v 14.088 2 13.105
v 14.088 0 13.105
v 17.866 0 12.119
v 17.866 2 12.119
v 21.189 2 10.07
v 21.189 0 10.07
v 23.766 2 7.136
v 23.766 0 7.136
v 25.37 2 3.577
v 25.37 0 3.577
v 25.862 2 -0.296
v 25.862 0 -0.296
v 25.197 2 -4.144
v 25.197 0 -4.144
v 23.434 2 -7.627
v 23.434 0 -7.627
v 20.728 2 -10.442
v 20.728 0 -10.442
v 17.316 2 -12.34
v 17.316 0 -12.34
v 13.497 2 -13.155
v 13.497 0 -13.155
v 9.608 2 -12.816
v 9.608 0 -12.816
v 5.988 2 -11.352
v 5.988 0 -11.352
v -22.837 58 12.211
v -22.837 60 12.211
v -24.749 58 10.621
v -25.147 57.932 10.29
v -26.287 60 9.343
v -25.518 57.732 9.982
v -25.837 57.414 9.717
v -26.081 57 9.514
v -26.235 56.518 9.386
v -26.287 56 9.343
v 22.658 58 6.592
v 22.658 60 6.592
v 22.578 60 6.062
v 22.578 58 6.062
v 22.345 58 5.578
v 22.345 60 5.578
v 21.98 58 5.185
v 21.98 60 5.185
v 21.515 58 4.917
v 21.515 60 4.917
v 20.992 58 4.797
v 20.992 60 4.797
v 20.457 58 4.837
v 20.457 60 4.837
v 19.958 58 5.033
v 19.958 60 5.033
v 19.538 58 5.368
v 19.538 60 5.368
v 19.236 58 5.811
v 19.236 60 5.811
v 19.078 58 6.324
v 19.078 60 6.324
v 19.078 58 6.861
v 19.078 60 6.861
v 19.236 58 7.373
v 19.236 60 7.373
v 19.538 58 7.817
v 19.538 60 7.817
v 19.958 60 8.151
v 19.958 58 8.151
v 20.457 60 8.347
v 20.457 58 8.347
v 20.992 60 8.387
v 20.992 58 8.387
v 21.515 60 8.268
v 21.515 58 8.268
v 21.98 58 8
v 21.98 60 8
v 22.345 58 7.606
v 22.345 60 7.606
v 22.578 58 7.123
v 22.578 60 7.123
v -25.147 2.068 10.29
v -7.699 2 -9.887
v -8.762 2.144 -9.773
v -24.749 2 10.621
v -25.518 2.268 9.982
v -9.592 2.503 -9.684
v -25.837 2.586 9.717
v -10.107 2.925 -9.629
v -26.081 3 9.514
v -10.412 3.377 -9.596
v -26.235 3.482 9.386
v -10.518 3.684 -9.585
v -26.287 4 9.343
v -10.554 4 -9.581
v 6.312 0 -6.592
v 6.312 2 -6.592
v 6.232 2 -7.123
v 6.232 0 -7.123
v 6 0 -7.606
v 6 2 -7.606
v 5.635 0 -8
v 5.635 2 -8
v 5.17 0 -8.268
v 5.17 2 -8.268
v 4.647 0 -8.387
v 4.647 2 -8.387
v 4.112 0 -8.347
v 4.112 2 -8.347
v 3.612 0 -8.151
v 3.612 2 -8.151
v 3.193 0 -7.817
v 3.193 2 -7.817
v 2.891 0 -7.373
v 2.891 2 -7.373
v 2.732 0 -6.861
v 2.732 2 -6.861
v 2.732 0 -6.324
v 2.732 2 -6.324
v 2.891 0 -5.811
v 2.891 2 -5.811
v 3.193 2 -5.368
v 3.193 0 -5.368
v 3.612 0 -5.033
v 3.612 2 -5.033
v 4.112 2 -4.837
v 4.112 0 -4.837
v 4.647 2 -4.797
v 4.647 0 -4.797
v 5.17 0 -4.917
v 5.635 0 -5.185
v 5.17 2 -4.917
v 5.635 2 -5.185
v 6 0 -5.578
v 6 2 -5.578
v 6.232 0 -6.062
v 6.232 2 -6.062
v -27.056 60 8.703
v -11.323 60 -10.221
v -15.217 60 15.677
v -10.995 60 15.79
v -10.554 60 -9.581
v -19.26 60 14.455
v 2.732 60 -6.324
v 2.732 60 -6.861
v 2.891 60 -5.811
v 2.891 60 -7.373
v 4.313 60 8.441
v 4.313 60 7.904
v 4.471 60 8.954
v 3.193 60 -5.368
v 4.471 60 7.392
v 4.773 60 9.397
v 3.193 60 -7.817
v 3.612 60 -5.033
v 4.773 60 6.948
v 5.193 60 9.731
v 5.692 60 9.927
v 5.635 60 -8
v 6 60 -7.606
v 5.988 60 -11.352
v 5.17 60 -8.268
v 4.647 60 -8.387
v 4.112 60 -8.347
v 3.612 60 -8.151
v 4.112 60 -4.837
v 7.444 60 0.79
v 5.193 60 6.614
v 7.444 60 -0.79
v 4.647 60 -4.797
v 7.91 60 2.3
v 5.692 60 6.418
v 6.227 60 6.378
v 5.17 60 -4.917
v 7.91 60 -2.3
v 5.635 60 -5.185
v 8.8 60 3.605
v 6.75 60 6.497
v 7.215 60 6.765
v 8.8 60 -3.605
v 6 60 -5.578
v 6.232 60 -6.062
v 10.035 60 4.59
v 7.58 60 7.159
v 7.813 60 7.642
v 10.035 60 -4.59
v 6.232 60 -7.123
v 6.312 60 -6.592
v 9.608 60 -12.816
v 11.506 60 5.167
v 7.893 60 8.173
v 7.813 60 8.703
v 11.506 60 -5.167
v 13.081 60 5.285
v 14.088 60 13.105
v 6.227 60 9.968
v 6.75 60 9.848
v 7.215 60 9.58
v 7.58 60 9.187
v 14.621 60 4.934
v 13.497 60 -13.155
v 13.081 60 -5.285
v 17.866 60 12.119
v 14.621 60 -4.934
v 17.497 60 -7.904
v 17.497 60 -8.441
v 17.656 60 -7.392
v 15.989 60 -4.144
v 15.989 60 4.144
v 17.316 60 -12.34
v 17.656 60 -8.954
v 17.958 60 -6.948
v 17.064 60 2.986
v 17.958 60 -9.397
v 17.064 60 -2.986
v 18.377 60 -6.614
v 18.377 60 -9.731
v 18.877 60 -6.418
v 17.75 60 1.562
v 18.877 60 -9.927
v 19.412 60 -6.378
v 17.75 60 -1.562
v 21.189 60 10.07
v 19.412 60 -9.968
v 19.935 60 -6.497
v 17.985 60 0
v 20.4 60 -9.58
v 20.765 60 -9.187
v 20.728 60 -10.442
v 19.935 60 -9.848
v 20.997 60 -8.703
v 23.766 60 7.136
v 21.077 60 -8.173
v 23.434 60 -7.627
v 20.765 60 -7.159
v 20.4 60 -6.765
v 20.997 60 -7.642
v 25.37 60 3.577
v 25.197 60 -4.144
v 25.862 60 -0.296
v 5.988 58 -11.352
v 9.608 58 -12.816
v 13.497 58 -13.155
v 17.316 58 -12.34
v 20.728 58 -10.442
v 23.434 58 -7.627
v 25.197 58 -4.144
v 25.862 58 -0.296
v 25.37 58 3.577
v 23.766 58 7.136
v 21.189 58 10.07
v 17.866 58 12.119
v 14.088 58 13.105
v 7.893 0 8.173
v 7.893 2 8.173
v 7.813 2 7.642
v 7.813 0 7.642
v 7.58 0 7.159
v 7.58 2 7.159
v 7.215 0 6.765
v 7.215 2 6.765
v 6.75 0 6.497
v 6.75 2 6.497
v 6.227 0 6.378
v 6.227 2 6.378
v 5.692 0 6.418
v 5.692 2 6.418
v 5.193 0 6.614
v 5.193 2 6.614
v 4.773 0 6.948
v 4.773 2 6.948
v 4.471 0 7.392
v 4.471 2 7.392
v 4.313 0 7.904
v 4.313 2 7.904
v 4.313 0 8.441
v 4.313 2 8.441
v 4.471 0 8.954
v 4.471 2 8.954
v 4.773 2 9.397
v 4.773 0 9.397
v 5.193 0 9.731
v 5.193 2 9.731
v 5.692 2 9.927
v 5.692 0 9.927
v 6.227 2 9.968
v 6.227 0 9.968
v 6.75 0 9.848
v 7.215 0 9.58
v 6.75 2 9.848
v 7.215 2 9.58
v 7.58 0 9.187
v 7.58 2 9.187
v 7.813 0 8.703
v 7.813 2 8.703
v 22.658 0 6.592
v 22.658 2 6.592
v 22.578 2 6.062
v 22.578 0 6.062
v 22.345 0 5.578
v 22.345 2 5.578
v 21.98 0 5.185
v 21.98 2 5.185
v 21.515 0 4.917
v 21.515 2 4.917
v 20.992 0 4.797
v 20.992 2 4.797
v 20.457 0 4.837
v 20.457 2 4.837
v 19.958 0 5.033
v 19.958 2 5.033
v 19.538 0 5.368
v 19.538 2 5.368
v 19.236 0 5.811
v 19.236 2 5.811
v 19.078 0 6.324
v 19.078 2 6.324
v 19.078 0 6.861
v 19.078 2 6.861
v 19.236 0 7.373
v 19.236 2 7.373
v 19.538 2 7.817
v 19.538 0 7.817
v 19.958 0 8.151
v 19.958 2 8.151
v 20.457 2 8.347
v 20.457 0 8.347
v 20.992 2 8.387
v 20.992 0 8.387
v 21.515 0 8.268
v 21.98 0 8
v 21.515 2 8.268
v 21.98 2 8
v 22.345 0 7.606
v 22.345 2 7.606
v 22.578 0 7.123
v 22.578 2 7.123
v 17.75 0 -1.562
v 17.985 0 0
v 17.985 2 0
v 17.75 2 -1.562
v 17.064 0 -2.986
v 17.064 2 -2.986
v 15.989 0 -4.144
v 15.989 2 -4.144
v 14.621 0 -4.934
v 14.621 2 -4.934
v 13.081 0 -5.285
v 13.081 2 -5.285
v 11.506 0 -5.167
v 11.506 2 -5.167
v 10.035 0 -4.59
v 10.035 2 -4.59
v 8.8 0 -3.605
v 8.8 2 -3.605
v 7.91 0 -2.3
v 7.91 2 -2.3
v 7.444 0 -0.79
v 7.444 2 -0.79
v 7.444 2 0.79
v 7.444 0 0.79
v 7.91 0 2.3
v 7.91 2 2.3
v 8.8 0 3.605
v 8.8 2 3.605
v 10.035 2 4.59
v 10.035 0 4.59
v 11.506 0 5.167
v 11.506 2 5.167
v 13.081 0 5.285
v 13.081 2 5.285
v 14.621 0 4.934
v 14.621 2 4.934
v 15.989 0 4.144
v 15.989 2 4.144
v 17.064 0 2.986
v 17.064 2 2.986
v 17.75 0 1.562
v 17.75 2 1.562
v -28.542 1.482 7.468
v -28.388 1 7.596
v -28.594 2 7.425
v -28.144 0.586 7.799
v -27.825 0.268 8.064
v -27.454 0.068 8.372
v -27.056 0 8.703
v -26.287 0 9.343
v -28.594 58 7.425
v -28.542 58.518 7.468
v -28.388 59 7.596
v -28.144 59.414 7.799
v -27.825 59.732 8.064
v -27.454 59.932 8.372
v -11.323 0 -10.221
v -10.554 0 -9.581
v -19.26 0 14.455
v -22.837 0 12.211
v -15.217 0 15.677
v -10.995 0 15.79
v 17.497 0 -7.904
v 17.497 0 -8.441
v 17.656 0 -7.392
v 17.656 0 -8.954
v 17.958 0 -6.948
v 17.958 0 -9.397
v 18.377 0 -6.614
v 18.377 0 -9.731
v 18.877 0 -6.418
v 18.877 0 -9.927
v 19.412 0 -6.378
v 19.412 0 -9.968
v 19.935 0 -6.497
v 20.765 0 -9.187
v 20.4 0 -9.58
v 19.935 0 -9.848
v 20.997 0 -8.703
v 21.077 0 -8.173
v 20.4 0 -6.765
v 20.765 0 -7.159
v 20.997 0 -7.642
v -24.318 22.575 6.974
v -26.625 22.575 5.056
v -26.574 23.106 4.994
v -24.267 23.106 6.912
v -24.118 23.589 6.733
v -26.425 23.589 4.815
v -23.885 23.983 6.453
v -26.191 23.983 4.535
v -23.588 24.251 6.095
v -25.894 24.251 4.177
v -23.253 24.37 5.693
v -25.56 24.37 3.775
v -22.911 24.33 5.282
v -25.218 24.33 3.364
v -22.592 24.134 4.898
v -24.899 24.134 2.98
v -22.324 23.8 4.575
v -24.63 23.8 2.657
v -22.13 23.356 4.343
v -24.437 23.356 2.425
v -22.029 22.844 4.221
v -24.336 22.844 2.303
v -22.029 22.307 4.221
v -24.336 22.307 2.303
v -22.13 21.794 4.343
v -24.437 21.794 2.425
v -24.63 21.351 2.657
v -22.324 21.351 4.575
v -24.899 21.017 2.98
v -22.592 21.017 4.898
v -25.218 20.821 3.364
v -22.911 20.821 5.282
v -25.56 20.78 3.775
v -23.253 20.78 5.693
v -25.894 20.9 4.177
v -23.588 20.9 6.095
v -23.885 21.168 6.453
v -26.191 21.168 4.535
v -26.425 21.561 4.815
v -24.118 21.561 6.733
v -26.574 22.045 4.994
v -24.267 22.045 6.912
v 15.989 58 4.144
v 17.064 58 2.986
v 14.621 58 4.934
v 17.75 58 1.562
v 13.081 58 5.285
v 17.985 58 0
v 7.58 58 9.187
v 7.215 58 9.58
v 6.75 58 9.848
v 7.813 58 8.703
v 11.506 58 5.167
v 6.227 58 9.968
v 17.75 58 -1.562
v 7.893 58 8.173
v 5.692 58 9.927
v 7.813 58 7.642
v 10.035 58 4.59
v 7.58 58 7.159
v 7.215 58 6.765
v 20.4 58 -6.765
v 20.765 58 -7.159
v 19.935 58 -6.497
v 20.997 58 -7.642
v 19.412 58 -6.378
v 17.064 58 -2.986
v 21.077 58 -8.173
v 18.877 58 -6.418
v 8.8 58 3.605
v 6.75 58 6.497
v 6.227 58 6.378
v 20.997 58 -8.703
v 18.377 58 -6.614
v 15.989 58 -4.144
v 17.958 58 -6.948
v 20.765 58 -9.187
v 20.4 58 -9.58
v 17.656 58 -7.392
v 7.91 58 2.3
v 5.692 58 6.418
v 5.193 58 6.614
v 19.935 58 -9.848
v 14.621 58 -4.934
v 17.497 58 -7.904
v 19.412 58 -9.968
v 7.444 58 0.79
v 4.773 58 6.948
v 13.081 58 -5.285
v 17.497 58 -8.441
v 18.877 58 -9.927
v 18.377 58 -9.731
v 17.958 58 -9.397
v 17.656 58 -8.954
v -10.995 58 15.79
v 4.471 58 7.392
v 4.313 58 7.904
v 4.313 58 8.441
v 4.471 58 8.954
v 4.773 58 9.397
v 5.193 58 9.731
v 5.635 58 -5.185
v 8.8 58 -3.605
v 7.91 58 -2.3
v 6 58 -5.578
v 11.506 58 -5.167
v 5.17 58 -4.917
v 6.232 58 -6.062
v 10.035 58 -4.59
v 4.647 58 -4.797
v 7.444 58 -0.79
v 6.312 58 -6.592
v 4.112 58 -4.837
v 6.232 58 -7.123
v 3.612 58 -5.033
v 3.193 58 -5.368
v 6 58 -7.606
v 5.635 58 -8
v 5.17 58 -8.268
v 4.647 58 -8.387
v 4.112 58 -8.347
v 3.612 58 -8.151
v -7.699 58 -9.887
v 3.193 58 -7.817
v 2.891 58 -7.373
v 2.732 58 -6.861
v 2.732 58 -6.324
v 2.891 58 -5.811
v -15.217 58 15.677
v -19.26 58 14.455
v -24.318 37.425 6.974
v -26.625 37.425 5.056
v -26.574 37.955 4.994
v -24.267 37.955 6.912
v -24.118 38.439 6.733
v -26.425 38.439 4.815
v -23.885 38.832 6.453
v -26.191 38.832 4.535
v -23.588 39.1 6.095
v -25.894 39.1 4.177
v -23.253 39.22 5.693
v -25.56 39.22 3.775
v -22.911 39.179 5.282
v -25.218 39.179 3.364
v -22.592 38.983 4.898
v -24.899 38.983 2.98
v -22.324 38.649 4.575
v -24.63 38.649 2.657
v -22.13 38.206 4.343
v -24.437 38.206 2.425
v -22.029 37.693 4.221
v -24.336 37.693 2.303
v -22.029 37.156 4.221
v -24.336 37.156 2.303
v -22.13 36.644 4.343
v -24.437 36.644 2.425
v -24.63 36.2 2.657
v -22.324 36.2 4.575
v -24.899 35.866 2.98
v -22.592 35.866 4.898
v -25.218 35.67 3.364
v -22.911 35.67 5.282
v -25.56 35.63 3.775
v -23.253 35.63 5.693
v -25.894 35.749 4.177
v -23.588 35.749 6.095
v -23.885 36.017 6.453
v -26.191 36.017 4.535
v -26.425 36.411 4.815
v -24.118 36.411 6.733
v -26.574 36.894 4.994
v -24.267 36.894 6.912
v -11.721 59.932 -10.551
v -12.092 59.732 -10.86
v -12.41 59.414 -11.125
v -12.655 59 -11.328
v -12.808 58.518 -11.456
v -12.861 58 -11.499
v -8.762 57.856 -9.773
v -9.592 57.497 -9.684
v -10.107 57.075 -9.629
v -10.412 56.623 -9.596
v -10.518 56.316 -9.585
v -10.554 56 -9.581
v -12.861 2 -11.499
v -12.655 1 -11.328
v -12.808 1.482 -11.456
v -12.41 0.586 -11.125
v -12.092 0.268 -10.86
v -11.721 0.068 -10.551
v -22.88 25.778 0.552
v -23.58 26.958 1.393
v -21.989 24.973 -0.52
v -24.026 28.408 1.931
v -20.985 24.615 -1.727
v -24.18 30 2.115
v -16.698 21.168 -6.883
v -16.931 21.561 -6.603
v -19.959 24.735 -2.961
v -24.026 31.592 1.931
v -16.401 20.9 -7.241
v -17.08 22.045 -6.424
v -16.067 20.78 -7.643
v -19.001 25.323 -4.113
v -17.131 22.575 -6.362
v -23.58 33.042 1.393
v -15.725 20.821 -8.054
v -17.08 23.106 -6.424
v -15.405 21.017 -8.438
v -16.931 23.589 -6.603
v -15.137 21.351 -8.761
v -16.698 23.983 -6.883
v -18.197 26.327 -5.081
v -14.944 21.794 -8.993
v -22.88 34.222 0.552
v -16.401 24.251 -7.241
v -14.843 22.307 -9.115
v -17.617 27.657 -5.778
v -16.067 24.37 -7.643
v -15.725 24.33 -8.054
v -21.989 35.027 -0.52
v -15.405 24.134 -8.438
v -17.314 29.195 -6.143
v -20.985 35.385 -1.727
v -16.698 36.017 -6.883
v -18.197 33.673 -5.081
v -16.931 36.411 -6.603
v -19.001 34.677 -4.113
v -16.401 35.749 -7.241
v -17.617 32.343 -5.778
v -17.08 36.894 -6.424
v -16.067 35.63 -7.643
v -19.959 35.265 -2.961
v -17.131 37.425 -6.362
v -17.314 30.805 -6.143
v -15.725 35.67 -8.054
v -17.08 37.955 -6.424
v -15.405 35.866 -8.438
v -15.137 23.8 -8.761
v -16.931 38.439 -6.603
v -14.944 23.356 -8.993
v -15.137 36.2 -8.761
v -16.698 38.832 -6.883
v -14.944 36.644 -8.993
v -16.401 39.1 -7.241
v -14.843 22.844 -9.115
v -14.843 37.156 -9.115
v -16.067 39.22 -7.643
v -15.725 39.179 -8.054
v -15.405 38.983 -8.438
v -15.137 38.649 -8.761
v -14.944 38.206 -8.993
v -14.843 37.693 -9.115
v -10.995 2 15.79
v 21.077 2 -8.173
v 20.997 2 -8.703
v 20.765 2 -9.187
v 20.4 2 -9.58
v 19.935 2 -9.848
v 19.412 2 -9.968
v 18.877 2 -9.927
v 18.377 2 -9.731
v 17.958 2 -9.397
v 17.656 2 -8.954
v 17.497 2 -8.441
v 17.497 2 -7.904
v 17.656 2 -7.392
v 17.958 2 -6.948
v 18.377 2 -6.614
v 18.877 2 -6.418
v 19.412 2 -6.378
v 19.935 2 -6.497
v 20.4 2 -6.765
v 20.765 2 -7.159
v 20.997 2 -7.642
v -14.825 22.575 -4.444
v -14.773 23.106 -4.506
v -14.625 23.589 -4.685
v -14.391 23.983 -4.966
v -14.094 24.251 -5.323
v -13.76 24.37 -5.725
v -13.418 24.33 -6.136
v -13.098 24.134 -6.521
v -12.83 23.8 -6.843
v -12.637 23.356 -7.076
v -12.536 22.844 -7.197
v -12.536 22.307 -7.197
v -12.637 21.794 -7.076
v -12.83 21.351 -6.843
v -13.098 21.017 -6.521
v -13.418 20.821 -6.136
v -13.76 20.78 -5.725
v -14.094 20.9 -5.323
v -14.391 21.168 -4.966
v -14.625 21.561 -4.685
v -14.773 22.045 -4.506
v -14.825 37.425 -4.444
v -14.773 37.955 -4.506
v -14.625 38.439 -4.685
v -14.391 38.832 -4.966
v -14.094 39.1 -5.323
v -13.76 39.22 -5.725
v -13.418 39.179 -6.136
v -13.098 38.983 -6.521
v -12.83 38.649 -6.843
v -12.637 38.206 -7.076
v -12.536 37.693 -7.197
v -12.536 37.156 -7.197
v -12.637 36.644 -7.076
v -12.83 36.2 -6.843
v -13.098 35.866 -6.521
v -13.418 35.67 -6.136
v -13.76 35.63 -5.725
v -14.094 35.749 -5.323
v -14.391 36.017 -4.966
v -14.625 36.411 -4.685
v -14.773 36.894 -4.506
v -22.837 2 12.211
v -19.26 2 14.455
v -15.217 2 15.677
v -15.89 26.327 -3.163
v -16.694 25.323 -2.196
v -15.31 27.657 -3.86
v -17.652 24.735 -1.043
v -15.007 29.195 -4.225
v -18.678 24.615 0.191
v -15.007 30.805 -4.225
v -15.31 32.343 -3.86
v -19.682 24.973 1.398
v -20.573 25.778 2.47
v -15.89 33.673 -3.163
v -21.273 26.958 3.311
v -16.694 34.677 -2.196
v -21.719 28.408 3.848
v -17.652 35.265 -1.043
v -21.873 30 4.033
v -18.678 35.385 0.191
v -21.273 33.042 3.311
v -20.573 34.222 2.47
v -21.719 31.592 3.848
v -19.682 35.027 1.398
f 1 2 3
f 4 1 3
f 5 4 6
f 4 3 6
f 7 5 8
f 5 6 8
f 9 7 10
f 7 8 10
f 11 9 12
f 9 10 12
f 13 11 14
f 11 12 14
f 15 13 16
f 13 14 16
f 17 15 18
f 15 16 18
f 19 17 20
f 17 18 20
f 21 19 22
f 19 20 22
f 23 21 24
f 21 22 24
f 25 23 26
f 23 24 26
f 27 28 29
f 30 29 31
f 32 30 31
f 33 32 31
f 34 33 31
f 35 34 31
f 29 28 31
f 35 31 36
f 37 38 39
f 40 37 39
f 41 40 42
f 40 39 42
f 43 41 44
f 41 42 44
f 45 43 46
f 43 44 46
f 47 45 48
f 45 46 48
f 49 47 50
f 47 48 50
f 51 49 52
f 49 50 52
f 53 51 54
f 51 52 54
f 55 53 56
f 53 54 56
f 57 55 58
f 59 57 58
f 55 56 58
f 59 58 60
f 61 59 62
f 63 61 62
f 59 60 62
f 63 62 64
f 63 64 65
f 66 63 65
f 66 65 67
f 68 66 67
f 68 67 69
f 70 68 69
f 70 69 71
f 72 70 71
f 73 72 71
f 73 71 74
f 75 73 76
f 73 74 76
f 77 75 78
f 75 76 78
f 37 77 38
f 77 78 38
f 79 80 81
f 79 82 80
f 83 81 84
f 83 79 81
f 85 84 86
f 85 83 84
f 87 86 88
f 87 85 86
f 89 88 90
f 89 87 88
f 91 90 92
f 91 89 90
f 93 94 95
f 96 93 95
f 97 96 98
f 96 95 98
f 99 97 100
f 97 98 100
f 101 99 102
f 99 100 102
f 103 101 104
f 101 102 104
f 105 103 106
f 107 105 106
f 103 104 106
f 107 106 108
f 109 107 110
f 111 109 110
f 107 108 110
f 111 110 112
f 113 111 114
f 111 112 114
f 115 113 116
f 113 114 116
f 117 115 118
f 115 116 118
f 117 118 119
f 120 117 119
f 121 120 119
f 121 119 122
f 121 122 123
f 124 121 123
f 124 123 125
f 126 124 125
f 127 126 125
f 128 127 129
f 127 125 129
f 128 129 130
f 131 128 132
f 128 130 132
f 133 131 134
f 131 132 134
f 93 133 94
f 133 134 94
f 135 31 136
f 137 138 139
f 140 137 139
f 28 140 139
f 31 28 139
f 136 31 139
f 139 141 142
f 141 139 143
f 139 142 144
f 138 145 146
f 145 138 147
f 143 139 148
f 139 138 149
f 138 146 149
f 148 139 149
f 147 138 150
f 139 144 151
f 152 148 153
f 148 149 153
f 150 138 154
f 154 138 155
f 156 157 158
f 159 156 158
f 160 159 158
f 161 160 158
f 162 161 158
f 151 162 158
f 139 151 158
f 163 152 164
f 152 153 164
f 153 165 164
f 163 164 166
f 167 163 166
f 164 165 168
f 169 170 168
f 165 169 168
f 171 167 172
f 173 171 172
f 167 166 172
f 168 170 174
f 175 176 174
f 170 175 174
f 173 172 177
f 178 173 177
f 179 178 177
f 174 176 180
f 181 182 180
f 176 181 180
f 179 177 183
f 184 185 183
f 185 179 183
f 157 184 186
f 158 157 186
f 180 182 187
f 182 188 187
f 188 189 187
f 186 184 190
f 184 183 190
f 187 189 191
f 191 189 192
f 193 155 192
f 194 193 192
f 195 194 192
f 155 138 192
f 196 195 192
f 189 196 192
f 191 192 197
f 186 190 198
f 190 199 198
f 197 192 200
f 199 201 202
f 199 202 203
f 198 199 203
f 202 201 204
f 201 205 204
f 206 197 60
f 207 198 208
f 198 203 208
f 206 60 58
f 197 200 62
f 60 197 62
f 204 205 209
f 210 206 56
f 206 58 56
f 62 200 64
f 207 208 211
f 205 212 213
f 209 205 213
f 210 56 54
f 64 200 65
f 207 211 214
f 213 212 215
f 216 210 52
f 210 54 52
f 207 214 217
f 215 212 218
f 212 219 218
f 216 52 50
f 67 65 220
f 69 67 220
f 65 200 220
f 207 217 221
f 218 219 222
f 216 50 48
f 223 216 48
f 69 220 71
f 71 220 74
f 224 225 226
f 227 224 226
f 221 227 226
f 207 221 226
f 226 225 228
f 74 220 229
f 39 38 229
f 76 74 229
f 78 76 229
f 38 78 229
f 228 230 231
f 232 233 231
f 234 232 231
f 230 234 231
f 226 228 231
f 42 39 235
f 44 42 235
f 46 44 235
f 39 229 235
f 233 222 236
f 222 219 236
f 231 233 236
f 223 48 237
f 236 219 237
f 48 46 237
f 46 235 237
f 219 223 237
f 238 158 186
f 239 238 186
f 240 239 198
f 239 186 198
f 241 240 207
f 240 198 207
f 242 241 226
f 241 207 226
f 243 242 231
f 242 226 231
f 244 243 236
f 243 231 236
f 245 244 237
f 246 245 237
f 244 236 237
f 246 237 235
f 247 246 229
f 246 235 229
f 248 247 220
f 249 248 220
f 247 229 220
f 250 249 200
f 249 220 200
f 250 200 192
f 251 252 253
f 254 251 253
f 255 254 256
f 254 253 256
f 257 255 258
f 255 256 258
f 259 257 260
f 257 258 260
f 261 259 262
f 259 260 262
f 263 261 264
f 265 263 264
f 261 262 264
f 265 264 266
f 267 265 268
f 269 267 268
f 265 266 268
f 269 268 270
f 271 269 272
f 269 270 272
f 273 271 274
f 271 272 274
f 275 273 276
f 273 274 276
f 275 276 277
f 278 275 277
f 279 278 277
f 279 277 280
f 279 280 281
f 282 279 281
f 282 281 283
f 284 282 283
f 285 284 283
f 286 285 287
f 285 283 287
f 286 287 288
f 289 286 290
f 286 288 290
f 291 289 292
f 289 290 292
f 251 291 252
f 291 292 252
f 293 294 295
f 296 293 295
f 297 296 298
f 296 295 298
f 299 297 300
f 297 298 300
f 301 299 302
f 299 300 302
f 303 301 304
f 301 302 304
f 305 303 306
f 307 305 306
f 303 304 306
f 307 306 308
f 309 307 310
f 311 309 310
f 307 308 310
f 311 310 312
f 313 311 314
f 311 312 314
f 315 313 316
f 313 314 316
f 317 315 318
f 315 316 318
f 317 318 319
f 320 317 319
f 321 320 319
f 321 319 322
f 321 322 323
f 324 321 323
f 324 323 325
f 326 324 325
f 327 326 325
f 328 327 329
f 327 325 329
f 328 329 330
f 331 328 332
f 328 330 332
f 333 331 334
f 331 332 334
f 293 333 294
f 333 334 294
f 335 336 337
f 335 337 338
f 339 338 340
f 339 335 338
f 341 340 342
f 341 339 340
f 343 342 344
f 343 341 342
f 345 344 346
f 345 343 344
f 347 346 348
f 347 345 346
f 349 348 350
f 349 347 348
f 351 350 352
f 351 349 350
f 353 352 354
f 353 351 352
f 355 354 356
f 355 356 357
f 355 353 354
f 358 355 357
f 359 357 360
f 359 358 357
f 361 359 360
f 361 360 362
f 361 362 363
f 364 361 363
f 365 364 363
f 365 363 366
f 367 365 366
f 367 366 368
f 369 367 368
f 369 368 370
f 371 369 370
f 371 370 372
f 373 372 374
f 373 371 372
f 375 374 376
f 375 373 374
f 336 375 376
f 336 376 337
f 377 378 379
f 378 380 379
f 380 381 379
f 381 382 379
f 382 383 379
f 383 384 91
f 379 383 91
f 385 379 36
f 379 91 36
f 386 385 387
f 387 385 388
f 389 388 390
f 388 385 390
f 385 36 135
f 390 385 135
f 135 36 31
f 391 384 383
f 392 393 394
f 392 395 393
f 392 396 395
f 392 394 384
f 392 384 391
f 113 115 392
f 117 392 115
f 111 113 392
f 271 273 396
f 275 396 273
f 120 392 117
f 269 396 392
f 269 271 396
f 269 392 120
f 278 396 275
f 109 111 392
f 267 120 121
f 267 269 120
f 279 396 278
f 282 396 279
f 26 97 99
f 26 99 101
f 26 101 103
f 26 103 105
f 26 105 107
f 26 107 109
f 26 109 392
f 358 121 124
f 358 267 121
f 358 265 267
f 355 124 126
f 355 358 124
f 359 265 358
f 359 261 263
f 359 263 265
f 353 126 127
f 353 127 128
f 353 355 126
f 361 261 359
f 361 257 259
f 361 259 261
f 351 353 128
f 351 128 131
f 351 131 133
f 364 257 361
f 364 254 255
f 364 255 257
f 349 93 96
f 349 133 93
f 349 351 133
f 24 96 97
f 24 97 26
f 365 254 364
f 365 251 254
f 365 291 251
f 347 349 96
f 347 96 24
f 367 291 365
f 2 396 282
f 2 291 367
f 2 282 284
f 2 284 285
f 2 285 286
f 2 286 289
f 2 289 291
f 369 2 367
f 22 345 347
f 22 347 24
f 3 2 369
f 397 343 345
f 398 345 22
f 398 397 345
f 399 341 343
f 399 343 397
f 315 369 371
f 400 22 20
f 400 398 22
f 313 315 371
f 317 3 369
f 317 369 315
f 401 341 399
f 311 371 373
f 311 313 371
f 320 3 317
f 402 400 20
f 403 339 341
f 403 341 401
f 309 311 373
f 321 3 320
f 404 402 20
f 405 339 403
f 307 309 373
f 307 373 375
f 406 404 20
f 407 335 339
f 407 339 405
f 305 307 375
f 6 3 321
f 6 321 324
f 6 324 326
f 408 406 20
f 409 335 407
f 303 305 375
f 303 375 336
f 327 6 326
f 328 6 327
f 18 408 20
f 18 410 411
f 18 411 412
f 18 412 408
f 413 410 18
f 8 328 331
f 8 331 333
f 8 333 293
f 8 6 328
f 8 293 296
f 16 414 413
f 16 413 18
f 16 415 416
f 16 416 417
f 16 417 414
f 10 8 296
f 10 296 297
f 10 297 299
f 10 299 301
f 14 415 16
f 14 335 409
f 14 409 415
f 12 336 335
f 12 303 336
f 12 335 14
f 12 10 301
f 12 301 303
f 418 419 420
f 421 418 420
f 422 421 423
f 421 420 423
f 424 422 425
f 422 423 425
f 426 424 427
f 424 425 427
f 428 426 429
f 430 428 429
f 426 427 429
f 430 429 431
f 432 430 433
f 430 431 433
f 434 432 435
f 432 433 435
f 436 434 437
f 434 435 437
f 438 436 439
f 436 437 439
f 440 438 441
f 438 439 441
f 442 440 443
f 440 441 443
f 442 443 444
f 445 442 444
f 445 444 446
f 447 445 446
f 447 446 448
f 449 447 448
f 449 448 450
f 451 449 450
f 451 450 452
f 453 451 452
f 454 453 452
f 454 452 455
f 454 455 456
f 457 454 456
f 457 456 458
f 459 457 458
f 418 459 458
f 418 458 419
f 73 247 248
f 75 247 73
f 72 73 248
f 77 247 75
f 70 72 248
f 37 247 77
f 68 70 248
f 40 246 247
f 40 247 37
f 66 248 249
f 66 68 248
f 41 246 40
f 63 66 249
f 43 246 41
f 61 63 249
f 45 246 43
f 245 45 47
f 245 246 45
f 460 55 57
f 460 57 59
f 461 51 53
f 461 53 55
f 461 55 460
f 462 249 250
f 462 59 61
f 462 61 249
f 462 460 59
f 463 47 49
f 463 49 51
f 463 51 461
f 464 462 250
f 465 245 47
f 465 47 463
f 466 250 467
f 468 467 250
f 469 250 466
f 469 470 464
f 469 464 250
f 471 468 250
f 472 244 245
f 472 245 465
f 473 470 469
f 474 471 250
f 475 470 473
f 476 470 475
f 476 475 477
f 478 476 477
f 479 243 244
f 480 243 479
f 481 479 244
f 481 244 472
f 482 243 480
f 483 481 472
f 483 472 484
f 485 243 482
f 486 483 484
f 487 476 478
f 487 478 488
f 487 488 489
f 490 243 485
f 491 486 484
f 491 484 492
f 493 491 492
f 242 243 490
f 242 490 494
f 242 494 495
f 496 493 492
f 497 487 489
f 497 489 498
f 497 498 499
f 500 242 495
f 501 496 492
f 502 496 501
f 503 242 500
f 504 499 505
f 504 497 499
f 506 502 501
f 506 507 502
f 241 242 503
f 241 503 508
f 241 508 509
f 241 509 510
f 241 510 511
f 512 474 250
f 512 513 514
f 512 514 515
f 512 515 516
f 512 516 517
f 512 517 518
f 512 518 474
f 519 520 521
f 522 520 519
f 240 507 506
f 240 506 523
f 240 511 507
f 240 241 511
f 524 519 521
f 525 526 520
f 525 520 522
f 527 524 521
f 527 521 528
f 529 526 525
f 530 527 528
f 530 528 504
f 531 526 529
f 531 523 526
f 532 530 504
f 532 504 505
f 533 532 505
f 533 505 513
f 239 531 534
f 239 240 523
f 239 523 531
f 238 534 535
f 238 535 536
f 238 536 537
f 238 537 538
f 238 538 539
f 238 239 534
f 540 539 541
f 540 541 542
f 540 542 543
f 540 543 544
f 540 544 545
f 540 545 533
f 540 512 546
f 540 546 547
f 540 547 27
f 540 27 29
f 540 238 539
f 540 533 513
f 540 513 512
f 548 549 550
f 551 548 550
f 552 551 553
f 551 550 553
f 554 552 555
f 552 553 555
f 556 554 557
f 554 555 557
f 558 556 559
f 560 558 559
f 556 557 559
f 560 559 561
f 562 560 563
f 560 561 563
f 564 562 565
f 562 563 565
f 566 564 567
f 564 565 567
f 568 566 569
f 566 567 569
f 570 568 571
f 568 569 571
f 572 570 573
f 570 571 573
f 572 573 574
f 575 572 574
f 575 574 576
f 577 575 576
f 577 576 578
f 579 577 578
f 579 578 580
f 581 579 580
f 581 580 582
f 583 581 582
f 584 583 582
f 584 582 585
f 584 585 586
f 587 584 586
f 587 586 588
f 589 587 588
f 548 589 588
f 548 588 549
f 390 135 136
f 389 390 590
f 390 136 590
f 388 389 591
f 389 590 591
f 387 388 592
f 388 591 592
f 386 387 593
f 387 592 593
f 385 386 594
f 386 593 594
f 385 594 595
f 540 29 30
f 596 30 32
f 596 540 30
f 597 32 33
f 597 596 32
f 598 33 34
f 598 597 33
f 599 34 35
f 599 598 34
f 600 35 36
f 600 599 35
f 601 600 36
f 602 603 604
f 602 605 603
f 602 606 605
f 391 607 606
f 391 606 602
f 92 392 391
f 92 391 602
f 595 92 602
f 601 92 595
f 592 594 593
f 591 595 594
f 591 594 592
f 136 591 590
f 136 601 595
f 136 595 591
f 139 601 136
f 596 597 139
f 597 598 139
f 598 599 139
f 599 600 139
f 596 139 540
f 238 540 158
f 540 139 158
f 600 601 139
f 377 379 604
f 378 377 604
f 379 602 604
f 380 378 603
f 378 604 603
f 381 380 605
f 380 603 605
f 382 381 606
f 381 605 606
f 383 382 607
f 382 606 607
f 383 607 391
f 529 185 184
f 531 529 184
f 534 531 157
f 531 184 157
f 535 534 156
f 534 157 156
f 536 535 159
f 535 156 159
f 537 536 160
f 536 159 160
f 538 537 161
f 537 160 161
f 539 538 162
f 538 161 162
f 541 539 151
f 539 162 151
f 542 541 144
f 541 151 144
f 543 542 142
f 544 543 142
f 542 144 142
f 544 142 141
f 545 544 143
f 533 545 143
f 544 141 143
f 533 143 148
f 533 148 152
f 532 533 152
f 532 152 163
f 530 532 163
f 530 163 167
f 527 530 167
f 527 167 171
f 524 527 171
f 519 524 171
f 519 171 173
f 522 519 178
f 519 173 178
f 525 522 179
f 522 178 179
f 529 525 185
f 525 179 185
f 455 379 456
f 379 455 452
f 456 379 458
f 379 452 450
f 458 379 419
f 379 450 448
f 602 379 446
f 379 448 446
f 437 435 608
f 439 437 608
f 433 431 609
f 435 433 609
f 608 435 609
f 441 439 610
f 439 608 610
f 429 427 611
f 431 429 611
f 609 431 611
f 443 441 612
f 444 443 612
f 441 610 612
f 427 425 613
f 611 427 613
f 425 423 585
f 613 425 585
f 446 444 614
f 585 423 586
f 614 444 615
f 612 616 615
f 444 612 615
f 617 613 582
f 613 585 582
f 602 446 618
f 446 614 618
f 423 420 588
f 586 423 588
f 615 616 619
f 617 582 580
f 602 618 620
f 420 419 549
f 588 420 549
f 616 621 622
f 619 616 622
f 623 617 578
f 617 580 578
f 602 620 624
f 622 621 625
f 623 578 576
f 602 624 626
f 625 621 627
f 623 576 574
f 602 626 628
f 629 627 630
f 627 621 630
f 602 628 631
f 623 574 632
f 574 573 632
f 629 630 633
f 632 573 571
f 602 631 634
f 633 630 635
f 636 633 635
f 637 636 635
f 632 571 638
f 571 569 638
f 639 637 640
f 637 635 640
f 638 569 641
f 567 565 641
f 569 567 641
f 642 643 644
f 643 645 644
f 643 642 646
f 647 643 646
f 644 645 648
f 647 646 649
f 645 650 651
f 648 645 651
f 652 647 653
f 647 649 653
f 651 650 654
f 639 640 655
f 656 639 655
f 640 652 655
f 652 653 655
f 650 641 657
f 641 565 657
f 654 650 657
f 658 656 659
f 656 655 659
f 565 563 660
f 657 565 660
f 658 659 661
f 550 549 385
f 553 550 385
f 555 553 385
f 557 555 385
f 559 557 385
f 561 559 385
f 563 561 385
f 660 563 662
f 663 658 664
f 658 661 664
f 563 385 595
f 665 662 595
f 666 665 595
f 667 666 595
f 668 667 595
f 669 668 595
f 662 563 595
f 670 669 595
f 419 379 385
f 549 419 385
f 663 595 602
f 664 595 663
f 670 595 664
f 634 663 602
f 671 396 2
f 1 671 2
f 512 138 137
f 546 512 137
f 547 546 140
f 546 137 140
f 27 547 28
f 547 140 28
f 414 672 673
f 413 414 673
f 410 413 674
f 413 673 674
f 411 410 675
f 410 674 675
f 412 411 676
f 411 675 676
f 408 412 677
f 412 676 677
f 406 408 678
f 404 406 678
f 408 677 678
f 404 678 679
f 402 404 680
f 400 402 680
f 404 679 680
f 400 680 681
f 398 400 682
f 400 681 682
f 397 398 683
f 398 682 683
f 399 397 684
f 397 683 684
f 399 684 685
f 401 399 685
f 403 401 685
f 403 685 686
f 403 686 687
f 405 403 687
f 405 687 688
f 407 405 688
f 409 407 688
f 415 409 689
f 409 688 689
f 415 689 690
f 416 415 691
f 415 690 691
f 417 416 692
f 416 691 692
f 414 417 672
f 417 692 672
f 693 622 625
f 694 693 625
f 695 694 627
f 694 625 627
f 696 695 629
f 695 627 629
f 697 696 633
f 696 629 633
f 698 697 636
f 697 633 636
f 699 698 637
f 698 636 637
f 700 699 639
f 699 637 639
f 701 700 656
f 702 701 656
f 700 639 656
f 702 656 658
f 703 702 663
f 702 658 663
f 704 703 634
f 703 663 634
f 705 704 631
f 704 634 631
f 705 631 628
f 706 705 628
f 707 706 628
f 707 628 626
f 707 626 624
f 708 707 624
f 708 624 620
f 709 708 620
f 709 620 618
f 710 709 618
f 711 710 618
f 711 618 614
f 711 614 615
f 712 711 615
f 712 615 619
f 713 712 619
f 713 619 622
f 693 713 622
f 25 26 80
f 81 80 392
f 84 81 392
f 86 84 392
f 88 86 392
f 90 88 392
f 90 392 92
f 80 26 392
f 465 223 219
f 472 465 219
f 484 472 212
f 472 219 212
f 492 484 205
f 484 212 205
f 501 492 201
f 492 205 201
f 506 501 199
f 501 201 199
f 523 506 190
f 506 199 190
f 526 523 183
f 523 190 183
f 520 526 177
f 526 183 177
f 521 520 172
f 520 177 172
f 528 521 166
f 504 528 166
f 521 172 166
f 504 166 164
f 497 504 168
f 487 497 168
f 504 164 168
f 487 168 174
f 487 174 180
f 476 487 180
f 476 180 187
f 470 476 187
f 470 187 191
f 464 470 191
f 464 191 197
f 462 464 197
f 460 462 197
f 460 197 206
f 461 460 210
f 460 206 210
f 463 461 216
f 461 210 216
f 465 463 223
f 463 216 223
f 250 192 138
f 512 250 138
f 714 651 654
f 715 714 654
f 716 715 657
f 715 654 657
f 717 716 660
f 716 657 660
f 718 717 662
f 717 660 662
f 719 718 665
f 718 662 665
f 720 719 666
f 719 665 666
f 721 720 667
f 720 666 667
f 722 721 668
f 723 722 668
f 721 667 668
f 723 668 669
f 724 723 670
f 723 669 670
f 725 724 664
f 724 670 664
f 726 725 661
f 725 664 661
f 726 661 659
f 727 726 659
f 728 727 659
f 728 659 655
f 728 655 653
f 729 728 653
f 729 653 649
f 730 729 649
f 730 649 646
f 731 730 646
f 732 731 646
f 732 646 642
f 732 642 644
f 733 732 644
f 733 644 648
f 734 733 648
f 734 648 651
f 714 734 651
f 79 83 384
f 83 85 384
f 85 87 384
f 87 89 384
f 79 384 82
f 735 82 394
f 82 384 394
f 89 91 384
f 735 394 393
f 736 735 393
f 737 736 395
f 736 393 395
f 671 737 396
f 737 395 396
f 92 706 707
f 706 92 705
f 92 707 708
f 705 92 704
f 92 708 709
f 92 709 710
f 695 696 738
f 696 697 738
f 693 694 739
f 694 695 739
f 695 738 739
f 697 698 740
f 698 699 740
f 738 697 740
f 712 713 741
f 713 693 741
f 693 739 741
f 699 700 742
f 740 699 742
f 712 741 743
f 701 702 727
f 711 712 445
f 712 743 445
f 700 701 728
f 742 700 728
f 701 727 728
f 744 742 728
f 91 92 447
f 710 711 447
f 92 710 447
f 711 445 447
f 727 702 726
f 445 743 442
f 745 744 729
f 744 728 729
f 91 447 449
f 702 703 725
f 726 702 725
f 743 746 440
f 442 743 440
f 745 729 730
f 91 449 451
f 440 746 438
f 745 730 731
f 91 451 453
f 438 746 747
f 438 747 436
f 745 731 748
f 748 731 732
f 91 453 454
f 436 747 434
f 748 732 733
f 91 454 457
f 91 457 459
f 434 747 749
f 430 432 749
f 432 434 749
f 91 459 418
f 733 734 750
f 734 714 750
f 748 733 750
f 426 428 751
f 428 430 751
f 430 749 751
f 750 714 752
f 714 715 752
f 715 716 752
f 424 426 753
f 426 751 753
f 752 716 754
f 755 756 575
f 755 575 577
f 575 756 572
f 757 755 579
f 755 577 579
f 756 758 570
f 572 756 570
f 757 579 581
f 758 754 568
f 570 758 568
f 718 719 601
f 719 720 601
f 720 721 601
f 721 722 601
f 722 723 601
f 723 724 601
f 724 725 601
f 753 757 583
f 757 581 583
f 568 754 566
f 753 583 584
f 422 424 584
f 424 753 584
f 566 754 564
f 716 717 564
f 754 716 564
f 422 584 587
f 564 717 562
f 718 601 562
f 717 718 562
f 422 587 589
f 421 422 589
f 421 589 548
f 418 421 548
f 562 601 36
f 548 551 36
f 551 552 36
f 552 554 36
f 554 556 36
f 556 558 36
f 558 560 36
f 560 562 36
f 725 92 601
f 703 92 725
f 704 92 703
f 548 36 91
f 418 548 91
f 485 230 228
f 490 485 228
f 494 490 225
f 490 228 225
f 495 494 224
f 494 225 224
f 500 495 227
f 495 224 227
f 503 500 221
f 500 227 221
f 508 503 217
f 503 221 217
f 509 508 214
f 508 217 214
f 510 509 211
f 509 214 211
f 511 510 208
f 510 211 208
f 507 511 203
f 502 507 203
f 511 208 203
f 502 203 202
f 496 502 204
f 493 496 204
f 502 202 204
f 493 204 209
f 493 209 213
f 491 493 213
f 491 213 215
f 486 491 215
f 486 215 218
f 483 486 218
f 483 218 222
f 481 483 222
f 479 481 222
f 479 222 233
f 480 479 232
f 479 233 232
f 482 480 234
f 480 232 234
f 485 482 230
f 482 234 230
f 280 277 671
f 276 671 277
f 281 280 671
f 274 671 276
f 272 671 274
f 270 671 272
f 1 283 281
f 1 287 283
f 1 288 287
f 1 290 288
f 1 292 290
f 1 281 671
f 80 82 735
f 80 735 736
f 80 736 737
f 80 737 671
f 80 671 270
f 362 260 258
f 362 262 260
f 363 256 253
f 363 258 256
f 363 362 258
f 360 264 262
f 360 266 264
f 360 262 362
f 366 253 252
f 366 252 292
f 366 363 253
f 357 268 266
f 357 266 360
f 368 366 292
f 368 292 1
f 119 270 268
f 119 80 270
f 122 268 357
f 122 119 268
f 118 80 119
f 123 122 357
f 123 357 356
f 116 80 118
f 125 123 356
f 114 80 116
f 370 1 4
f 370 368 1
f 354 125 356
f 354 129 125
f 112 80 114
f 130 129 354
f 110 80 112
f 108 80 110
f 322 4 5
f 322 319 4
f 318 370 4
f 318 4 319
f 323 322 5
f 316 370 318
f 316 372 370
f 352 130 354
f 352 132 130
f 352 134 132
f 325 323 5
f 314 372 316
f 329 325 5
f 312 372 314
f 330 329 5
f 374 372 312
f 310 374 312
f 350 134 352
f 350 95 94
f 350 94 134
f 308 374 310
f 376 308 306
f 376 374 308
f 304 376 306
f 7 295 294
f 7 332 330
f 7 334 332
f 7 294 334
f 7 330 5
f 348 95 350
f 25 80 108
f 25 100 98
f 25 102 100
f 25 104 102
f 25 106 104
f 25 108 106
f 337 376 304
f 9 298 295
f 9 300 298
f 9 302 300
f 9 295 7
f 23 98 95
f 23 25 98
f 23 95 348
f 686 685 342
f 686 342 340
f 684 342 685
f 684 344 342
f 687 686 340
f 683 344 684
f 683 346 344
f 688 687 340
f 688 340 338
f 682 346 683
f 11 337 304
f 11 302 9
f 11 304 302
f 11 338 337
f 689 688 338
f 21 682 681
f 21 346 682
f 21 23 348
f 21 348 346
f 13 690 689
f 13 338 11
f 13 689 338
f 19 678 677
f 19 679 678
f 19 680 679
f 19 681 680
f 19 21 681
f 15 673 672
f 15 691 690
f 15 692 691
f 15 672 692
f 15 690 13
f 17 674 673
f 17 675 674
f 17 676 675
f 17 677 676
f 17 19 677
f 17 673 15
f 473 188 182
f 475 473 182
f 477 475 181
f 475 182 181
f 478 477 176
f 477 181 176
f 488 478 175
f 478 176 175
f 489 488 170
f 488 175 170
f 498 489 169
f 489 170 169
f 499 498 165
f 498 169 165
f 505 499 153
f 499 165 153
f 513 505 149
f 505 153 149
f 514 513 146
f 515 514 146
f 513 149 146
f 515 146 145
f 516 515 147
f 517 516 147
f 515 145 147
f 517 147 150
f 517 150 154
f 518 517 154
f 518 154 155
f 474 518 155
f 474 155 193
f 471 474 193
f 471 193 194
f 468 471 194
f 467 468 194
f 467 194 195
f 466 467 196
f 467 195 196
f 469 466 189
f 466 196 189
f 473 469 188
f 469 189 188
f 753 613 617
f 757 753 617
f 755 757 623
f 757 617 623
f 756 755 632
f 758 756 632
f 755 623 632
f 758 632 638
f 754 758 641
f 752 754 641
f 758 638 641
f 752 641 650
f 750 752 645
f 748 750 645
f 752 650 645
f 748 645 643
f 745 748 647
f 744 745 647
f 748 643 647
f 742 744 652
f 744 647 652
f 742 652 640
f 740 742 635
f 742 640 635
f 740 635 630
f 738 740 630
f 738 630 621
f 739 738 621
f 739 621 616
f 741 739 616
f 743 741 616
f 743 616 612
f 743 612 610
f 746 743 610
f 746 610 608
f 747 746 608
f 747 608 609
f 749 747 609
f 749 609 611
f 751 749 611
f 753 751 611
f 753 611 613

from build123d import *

# Parameters (mm, degrees)
CROQUIS1_R              = 5.3
SALIENTE_EXTRUIR1_DEPTH = 2
CROQUIS2_R              = 1.8
CORTAR_EXTRUIR1_DEPTH   = 2
CROQUIS3_W              = 24.61
CROQUIS3_H              = 60
SALIENTE_EXTRUIR2_DEPTH = 2
CROQUIS4_R              = 5.3
CROQUIS4_R_2            = 1.8
SALIENTE_EXTRUIR3_DEPTH = 2
CORTAR_EXTRUIR2_REACH   = 48.282
CROQUIS5_R              = 5.4
CROQUIS5_R_2            = 1.8
CROQUIS6_W              = 24.61
CROQUIS6_H              = 60
SALIENTE_EXTRUIR4_DEPTH = 1
CORTAR_EXTRUIR3_REACH   = 49.282
CROQUIS7_R              = 5.4
CROQUIS7_R_2            = 1.8
REDONDEO1_R             = 2


with BuildPart() as part:
    # Croquis1 → Saliente-Extruir1 (new body)
    with BuildSketch(Plane(origin=(0, 0, 0), x_dir=(1, 0, 0), z_dir=(0, 1, 0))):
        with BuildLine():
            Line((-10.994972408, -15.789813385), (14.087680331, -13.105147381))
            ThreePointArc((14.087680331, -13.105147381), (25.196689721, 4.143672323), (5.987949996, 11.351736486))
            Line((5.987949996, 11.351736486), (-10.55372573, 9.581234979))
            Line((-10.55372573, 9.581234979), (-26.287258722, -9.342507769))
            Line((-26.287258722, -9.342507769), (-22.837316291, -12.210850664))
            ThreePointArc((-22.837316291, -12.210850664), (-17.278998917, -15.200972796), (-10.994972408, -15.789813385))
        make_face()
        with Locations((12.685, 0)):
            Circle(CROQUIS1_R, mode=Mode.SUBTRACT)
    extrude(amount=SALIENTE_EXTRUIR1_DEPTH)

    # Croquis2 → Cortar-Extruir1 (cut)
    with BuildSketch(Plane(origin=(0, 2, 0), x_dir=(1, 0, 0), z_dir=(0, 1, 0))):
        with Locations((6.092709789, -8.172619517)):
            Circle(CROQUIS2_R)
        with Locations((20.857619517, -6.592290211)):
            Circle(CROQUIS2_R)
        with Locations((19.277290211, 8.172619517)):
            Circle(CROQUIS2_R)
        with Locations((4.512380483, 6.592290211)):
            Circle(CROQUIS2_R)
    extrude(amount=-CORTAR_EXTRUIR1_DEPTH, mode=Mode.SUBTRACT)

    # Croquis3 → Saliente-Extruir2 (add)
    with BuildSketch(Plane(origin=(-10.950288723, 0, -9.104262893), x_dir=(-0.639314628, 0, 0.768945256), z_dir=(-0.768945256, 0, -0.639314628))):
        with Locations((11.684706055, 30)):
            Rectangle(CROQUIS3_W, CROQUIS3_H)
    extrude(amount=SALIENTE_EXTRUIR2_DEPTH)

    # Croquis4 → Saliente-Extruir3 (add)
    with BuildSketch(Plane(origin=(0, 60, 0), x_dir=(1, 0, 0), z_dir=(0, 1, 0))):
        with BuildLine():
            Line((14.087680331, -13.105147381), (-10.994972408, -15.789813385))
            ThreePointArc((-10.994972408, -15.789813385), (-17.278998917, -15.200972796), (-22.837316291, -12.210850664))
            Line((-22.837316291, -12.210850664), (-26.287258722, -9.342507769))
            Line((-26.287258722, -9.342507769), (-10.55372573, 9.581234979))
            Line((-10.55372573, 9.581234979), (5.987949996, 11.351736486))
            ThreePointArc((5.987949996, 11.351736486), (25.196689721, 4.143672323), (14.087680331, -13.105147381))
        make_face()
        with Locations((12.685, 0)):
            Circle(CROQUIS4_R, mode=Mode.SUBTRACT)
        with Locations((4.512380483, 6.592290211)):
            Circle(CROQUIS4_R_2, mode=Mode.SUBTRACT)
        with Locations((19.277290211, 8.172619517)):
            Circle(CROQUIS4_R_2, mode=Mode.SUBTRACT)
        with Locations((20.857619517, -6.592290211)):
            Circle(CROQUIS4_R_2, mode=Mode.SUBTRACT)
        with Locations((6.092709789, -8.172619517)):
            Circle(CROQUIS4_R_2, mode=Mode.SUBTRACT)
    extrude(amount=-SALIENTE_EXTRUIR3_DEPTH)

    # Croquis5 → Cortar-Extruir2 (cut, up to next)
    with BuildSketch(Plane(origin=(-12.488179234, 0, -10.382892148), x_dir=(-0.639314628, 0, 0.768945256), z_dir=(-0.768945256, 0, -0.639314628)), mode=Mode.PRIVATE) as cortar_extruir2_sk1:
        with Locations((11.684706055, 30)):
            Circle(CROQUIS5_R)
    cortar_extruir2_tool1 = extrude(cortar_extruir2_sk1.sketch, amount=-CORTAR_EXTRUIR2_REACH, mode=Mode.PRIVATE) & part.part
    add(cortar_extruir2_tool1.solids().sort_by_distance((-19.958383, 30, -1.397993))[0], mode=Mode.SUBTRACT)
    # Croquis5 → Cortar-Extruir2 (cut, up to next)
    with BuildSketch(Plane(origin=(-12.488179234, 0, -10.382892148), x_dir=(-0.639314628, 0, 0.768945256), z_dir=(-0.768945256, 0, -0.639314628)), mode=Mode.PRIVATE) as cortar_extruir2_sk2:
        with Locations((19.109327257, 37.424621202)):
            Circle(CROQUIS5_R_2)
    cortar_extruir2_tool2 = extrude(cortar_extruir2_sk2.sketch, amount=-CORTAR_EXTRUIR2_REACH, mode=Mode.PRIVATE) & part.part
    add(cortar_extruir2_tool2.solids().sort_by_distance((-24.705052, 37.424621, 4.311134))[0], mode=Mode.SUBTRACT)
    # Croquis5 → Cortar-Extruir2 (cut, up to next)
    with BuildSketch(Plane(origin=(-12.488179234, 0, -10.382892148), x_dir=(-0.639314628, 0, 0.768945256), z_dir=(-0.768945256, 0, -0.639314628)), mode=Mode.PRIVATE) as cortar_extruir2_sk3:
        with Locations((19.109327257, 22.575378798)):
            Circle(CROQUIS5_R_2)
    cortar_extruir2_tool3 = extrude(cortar_extruir2_sk3.sketch, amount=-CORTAR_EXTRUIR2_REACH, mode=Mode.PRIVATE) & part.part
    add(cortar_extruir2_tool3.solids().sort_by_distance((-24.705052, 22.575379, 4.311134))[0], mode=Mode.SUBTRACT)
    # Croquis5 → Cortar-Extruir2 (cut, up to next)
    with BuildSketch(Plane(origin=(-12.488179234, 0, -10.382892148), x_dir=(-0.639314628, 0, 0.768945256), z_dir=(-0.768945256, 0, -0.639314628)), mode=Mode.PRIVATE) as cortar_extruir2_sk4:
        with Locations((4.260084852, 22.575378798)):
            Circle(CROQUIS5_R_2)
    cortar_extruir2_tool4 = extrude(cortar_extruir2_sk4.sketch, amount=-CORTAR_EXTRUIR2_REACH, mode=Mode.PRIVATE) & part.part
    add(cortar_extruir2_tool4.solids().sort_by_distance((-15.211714, 22.575379, -7.10712))[0], mode=Mode.SUBTRACT)
    # Croquis5 → Cortar-Extruir2 (cut, up to next)
    with BuildSketch(Plane(origin=(-12.488179234, 0, -10.382892148), x_dir=(-0.639314628, 0, 0.768945256), z_dir=(-0.768945256, 0, -0.639314628)), mode=Mode.PRIVATE) as cortar_extruir2_sk5:
        with Locations((4.260084852, 37.424621202)):
            Circle(CROQUIS5_R_2)
    cortar_extruir2_tool5 = extrude(cortar_extruir2_sk5.sketch, amount=-CORTAR_EXTRUIR2_REACH, mode=Mode.PRIVATE) & part.part
    add(cortar_extruir2_tool5.solids().sort_by_distance((-15.211714, 37.424621, -7.10712))[0], mode=Mode.SUBTRACT)

    # Croquis6 → Saliente-Extruir4 (add)
    with BuildSketch(Plane(origin=(-12.488179234, 0, -10.382892148), x_dir=(0.639314628, 0, -0.768945256), z_dir=(0.768945256, 0, 0.639314628))):
        with Locations((-11.684706055, 30)):
            Rectangle(CROQUIS6_W, CROQUIS6_H)
    extrude(amount=-SALIENTE_EXTRUIR4_DEPTH)

    # Croquis7 → Cortar-Extruir3 (cut, up to next)
    with BuildSketch(Plane(origin=(-13.25712449, 0, -11.022206776), x_dir=(-0.639314628, 0, 0.768945256), z_dir=(-0.768945256, 0, -0.639314628)), mode=Mode.PRIVATE) as cortar_extruir3_sk1:
        with Locations((11.684706055, 30)):
            Circle(CROQUIS7_R)
    cortar_extruir3_tool1 = extrude(cortar_extruir3_sk1.sketch, amount=-CORTAR_EXTRUIR3_REACH, mode=Mode.PRIVATE) & part.part
    add(cortar_extruir3_tool1.solids().sort_by_distance((-20.727328, 30, -2.037307))[0], mode=Mode.SUBTRACT)
    # Croquis7 → Cortar-Extruir3 (cut, up to next)
    with BuildSketch(Plane(origin=(-13.25712449, 0, -11.022206776), x_dir=(-0.639314628, 0, 0.768945256), z_dir=(-0.768945256, 0, -0.639314628)), mode=Mode.PRIVATE) as cortar_extruir3_sk2:
        with Locations((4.260084852, 37.424621202)):
            Circle(CROQUIS7_R_2)
    cortar_extruir3_tool2 = extrude(cortar_extruir3_sk2.sketch, amount=-CORTAR_EXTRUIR3_REACH, mode=Mode.PRIVATE) & part.part
    add(cortar_extruir3_tool2.solids().sort_by_distance((-15.980659, 37.424621, -7.746435))[0], mode=Mode.SUBTRACT)
    # Croquis7 → Cortar-Extruir3 (cut, up to next)
    with BuildSketch(Plane(origin=(-13.25712449, 0, -11.022206776), x_dir=(-0.639314628, 0, 0.768945256), z_dir=(-0.768945256, 0, -0.639314628)), mode=Mode.PRIVATE) as cortar_extruir3_sk3:
        with Locations((19.109327257, 37.424621202)):
            Circle(CROQUIS7_R_2)
    cortar_extruir3_tool3 = extrude(cortar_extruir3_sk3.sketch, amount=-CORTAR_EXTRUIR3_REACH, mode=Mode.PRIVATE) & part.part
    add(cortar_extruir3_tool3.solids().sort_by_distance((-25.473997, 37.424621, 3.67182))[0], mode=Mode.SUBTRACT)
    # Croquis7 → Cortar-Extruir3 (cut, up to next)
    with BuildSketch(Plane(origin=(-13.25712449, 0, -11.022206776), x_dir=(-0.639314628, 0, 0.768945256), z_dir=(-0.768945256, 0, -0.639314628)), mode=Mode.PRIVATE) as cortar_extruir3_sk4:
        with Locations((19.109327257, 22.575378798)):
            Circle(CROQUIS7_R_2)
    cortar_extruir3_tool4 = extrude(cortar_extruir3_sk4.sketch, amount=-CORTAR_EXTRUIR3_REACH, mode=Mode.PRIVATE) & part.part
    add(cortar_extruir3_tool4.solids().sort_by_distance((-25.473997, 22.575379, 3.67182))[0], mode=Mode.SUBTRACT)
    # Croquis7 → Cortar-Extruir3 (cut, up to next)
    with BuildSketch(Plane(origin=(-13.25712449, 0, -11.022206776), x_dir=(-0.639314628, 0, 0.768945256), z_dir=(-0.768945256, 0, -0.639314628)), mode=Mode.PRIVATE) as cortar_extruir3_sk5:
        with Locations((4.260084852, 22.575378798)):
            Circle(CROQUIS7_R_2)
    cortar_extruir3_tool5 = extrude(cortar_extruir3_sk5.sketch, amount=-CORTAR_EXTRUIR3_REACH, mode=Mode.PRIVATE) & part.part
    add(cortar_extruir3_tool5.solids().sort_by_distance((-15.980659, 22.575379, -7.746435))[0], mode=Mode.SUBTRACT)

    # Redondeo1
    redondeo1_edges = [part.edges().sort_by_distance(p)[0] for p in [
        (-20.727327994, 60, -2.037307489),
        (-18.420492226, 2, -0.119363605),
        (-18.420492226, 58, -0.119363605),
        (-20.727327994, 0, -2.037307489),
    ]]
    fillet(redondeo1_edges, radius=REDONDEO1_R)


solid = part.part
